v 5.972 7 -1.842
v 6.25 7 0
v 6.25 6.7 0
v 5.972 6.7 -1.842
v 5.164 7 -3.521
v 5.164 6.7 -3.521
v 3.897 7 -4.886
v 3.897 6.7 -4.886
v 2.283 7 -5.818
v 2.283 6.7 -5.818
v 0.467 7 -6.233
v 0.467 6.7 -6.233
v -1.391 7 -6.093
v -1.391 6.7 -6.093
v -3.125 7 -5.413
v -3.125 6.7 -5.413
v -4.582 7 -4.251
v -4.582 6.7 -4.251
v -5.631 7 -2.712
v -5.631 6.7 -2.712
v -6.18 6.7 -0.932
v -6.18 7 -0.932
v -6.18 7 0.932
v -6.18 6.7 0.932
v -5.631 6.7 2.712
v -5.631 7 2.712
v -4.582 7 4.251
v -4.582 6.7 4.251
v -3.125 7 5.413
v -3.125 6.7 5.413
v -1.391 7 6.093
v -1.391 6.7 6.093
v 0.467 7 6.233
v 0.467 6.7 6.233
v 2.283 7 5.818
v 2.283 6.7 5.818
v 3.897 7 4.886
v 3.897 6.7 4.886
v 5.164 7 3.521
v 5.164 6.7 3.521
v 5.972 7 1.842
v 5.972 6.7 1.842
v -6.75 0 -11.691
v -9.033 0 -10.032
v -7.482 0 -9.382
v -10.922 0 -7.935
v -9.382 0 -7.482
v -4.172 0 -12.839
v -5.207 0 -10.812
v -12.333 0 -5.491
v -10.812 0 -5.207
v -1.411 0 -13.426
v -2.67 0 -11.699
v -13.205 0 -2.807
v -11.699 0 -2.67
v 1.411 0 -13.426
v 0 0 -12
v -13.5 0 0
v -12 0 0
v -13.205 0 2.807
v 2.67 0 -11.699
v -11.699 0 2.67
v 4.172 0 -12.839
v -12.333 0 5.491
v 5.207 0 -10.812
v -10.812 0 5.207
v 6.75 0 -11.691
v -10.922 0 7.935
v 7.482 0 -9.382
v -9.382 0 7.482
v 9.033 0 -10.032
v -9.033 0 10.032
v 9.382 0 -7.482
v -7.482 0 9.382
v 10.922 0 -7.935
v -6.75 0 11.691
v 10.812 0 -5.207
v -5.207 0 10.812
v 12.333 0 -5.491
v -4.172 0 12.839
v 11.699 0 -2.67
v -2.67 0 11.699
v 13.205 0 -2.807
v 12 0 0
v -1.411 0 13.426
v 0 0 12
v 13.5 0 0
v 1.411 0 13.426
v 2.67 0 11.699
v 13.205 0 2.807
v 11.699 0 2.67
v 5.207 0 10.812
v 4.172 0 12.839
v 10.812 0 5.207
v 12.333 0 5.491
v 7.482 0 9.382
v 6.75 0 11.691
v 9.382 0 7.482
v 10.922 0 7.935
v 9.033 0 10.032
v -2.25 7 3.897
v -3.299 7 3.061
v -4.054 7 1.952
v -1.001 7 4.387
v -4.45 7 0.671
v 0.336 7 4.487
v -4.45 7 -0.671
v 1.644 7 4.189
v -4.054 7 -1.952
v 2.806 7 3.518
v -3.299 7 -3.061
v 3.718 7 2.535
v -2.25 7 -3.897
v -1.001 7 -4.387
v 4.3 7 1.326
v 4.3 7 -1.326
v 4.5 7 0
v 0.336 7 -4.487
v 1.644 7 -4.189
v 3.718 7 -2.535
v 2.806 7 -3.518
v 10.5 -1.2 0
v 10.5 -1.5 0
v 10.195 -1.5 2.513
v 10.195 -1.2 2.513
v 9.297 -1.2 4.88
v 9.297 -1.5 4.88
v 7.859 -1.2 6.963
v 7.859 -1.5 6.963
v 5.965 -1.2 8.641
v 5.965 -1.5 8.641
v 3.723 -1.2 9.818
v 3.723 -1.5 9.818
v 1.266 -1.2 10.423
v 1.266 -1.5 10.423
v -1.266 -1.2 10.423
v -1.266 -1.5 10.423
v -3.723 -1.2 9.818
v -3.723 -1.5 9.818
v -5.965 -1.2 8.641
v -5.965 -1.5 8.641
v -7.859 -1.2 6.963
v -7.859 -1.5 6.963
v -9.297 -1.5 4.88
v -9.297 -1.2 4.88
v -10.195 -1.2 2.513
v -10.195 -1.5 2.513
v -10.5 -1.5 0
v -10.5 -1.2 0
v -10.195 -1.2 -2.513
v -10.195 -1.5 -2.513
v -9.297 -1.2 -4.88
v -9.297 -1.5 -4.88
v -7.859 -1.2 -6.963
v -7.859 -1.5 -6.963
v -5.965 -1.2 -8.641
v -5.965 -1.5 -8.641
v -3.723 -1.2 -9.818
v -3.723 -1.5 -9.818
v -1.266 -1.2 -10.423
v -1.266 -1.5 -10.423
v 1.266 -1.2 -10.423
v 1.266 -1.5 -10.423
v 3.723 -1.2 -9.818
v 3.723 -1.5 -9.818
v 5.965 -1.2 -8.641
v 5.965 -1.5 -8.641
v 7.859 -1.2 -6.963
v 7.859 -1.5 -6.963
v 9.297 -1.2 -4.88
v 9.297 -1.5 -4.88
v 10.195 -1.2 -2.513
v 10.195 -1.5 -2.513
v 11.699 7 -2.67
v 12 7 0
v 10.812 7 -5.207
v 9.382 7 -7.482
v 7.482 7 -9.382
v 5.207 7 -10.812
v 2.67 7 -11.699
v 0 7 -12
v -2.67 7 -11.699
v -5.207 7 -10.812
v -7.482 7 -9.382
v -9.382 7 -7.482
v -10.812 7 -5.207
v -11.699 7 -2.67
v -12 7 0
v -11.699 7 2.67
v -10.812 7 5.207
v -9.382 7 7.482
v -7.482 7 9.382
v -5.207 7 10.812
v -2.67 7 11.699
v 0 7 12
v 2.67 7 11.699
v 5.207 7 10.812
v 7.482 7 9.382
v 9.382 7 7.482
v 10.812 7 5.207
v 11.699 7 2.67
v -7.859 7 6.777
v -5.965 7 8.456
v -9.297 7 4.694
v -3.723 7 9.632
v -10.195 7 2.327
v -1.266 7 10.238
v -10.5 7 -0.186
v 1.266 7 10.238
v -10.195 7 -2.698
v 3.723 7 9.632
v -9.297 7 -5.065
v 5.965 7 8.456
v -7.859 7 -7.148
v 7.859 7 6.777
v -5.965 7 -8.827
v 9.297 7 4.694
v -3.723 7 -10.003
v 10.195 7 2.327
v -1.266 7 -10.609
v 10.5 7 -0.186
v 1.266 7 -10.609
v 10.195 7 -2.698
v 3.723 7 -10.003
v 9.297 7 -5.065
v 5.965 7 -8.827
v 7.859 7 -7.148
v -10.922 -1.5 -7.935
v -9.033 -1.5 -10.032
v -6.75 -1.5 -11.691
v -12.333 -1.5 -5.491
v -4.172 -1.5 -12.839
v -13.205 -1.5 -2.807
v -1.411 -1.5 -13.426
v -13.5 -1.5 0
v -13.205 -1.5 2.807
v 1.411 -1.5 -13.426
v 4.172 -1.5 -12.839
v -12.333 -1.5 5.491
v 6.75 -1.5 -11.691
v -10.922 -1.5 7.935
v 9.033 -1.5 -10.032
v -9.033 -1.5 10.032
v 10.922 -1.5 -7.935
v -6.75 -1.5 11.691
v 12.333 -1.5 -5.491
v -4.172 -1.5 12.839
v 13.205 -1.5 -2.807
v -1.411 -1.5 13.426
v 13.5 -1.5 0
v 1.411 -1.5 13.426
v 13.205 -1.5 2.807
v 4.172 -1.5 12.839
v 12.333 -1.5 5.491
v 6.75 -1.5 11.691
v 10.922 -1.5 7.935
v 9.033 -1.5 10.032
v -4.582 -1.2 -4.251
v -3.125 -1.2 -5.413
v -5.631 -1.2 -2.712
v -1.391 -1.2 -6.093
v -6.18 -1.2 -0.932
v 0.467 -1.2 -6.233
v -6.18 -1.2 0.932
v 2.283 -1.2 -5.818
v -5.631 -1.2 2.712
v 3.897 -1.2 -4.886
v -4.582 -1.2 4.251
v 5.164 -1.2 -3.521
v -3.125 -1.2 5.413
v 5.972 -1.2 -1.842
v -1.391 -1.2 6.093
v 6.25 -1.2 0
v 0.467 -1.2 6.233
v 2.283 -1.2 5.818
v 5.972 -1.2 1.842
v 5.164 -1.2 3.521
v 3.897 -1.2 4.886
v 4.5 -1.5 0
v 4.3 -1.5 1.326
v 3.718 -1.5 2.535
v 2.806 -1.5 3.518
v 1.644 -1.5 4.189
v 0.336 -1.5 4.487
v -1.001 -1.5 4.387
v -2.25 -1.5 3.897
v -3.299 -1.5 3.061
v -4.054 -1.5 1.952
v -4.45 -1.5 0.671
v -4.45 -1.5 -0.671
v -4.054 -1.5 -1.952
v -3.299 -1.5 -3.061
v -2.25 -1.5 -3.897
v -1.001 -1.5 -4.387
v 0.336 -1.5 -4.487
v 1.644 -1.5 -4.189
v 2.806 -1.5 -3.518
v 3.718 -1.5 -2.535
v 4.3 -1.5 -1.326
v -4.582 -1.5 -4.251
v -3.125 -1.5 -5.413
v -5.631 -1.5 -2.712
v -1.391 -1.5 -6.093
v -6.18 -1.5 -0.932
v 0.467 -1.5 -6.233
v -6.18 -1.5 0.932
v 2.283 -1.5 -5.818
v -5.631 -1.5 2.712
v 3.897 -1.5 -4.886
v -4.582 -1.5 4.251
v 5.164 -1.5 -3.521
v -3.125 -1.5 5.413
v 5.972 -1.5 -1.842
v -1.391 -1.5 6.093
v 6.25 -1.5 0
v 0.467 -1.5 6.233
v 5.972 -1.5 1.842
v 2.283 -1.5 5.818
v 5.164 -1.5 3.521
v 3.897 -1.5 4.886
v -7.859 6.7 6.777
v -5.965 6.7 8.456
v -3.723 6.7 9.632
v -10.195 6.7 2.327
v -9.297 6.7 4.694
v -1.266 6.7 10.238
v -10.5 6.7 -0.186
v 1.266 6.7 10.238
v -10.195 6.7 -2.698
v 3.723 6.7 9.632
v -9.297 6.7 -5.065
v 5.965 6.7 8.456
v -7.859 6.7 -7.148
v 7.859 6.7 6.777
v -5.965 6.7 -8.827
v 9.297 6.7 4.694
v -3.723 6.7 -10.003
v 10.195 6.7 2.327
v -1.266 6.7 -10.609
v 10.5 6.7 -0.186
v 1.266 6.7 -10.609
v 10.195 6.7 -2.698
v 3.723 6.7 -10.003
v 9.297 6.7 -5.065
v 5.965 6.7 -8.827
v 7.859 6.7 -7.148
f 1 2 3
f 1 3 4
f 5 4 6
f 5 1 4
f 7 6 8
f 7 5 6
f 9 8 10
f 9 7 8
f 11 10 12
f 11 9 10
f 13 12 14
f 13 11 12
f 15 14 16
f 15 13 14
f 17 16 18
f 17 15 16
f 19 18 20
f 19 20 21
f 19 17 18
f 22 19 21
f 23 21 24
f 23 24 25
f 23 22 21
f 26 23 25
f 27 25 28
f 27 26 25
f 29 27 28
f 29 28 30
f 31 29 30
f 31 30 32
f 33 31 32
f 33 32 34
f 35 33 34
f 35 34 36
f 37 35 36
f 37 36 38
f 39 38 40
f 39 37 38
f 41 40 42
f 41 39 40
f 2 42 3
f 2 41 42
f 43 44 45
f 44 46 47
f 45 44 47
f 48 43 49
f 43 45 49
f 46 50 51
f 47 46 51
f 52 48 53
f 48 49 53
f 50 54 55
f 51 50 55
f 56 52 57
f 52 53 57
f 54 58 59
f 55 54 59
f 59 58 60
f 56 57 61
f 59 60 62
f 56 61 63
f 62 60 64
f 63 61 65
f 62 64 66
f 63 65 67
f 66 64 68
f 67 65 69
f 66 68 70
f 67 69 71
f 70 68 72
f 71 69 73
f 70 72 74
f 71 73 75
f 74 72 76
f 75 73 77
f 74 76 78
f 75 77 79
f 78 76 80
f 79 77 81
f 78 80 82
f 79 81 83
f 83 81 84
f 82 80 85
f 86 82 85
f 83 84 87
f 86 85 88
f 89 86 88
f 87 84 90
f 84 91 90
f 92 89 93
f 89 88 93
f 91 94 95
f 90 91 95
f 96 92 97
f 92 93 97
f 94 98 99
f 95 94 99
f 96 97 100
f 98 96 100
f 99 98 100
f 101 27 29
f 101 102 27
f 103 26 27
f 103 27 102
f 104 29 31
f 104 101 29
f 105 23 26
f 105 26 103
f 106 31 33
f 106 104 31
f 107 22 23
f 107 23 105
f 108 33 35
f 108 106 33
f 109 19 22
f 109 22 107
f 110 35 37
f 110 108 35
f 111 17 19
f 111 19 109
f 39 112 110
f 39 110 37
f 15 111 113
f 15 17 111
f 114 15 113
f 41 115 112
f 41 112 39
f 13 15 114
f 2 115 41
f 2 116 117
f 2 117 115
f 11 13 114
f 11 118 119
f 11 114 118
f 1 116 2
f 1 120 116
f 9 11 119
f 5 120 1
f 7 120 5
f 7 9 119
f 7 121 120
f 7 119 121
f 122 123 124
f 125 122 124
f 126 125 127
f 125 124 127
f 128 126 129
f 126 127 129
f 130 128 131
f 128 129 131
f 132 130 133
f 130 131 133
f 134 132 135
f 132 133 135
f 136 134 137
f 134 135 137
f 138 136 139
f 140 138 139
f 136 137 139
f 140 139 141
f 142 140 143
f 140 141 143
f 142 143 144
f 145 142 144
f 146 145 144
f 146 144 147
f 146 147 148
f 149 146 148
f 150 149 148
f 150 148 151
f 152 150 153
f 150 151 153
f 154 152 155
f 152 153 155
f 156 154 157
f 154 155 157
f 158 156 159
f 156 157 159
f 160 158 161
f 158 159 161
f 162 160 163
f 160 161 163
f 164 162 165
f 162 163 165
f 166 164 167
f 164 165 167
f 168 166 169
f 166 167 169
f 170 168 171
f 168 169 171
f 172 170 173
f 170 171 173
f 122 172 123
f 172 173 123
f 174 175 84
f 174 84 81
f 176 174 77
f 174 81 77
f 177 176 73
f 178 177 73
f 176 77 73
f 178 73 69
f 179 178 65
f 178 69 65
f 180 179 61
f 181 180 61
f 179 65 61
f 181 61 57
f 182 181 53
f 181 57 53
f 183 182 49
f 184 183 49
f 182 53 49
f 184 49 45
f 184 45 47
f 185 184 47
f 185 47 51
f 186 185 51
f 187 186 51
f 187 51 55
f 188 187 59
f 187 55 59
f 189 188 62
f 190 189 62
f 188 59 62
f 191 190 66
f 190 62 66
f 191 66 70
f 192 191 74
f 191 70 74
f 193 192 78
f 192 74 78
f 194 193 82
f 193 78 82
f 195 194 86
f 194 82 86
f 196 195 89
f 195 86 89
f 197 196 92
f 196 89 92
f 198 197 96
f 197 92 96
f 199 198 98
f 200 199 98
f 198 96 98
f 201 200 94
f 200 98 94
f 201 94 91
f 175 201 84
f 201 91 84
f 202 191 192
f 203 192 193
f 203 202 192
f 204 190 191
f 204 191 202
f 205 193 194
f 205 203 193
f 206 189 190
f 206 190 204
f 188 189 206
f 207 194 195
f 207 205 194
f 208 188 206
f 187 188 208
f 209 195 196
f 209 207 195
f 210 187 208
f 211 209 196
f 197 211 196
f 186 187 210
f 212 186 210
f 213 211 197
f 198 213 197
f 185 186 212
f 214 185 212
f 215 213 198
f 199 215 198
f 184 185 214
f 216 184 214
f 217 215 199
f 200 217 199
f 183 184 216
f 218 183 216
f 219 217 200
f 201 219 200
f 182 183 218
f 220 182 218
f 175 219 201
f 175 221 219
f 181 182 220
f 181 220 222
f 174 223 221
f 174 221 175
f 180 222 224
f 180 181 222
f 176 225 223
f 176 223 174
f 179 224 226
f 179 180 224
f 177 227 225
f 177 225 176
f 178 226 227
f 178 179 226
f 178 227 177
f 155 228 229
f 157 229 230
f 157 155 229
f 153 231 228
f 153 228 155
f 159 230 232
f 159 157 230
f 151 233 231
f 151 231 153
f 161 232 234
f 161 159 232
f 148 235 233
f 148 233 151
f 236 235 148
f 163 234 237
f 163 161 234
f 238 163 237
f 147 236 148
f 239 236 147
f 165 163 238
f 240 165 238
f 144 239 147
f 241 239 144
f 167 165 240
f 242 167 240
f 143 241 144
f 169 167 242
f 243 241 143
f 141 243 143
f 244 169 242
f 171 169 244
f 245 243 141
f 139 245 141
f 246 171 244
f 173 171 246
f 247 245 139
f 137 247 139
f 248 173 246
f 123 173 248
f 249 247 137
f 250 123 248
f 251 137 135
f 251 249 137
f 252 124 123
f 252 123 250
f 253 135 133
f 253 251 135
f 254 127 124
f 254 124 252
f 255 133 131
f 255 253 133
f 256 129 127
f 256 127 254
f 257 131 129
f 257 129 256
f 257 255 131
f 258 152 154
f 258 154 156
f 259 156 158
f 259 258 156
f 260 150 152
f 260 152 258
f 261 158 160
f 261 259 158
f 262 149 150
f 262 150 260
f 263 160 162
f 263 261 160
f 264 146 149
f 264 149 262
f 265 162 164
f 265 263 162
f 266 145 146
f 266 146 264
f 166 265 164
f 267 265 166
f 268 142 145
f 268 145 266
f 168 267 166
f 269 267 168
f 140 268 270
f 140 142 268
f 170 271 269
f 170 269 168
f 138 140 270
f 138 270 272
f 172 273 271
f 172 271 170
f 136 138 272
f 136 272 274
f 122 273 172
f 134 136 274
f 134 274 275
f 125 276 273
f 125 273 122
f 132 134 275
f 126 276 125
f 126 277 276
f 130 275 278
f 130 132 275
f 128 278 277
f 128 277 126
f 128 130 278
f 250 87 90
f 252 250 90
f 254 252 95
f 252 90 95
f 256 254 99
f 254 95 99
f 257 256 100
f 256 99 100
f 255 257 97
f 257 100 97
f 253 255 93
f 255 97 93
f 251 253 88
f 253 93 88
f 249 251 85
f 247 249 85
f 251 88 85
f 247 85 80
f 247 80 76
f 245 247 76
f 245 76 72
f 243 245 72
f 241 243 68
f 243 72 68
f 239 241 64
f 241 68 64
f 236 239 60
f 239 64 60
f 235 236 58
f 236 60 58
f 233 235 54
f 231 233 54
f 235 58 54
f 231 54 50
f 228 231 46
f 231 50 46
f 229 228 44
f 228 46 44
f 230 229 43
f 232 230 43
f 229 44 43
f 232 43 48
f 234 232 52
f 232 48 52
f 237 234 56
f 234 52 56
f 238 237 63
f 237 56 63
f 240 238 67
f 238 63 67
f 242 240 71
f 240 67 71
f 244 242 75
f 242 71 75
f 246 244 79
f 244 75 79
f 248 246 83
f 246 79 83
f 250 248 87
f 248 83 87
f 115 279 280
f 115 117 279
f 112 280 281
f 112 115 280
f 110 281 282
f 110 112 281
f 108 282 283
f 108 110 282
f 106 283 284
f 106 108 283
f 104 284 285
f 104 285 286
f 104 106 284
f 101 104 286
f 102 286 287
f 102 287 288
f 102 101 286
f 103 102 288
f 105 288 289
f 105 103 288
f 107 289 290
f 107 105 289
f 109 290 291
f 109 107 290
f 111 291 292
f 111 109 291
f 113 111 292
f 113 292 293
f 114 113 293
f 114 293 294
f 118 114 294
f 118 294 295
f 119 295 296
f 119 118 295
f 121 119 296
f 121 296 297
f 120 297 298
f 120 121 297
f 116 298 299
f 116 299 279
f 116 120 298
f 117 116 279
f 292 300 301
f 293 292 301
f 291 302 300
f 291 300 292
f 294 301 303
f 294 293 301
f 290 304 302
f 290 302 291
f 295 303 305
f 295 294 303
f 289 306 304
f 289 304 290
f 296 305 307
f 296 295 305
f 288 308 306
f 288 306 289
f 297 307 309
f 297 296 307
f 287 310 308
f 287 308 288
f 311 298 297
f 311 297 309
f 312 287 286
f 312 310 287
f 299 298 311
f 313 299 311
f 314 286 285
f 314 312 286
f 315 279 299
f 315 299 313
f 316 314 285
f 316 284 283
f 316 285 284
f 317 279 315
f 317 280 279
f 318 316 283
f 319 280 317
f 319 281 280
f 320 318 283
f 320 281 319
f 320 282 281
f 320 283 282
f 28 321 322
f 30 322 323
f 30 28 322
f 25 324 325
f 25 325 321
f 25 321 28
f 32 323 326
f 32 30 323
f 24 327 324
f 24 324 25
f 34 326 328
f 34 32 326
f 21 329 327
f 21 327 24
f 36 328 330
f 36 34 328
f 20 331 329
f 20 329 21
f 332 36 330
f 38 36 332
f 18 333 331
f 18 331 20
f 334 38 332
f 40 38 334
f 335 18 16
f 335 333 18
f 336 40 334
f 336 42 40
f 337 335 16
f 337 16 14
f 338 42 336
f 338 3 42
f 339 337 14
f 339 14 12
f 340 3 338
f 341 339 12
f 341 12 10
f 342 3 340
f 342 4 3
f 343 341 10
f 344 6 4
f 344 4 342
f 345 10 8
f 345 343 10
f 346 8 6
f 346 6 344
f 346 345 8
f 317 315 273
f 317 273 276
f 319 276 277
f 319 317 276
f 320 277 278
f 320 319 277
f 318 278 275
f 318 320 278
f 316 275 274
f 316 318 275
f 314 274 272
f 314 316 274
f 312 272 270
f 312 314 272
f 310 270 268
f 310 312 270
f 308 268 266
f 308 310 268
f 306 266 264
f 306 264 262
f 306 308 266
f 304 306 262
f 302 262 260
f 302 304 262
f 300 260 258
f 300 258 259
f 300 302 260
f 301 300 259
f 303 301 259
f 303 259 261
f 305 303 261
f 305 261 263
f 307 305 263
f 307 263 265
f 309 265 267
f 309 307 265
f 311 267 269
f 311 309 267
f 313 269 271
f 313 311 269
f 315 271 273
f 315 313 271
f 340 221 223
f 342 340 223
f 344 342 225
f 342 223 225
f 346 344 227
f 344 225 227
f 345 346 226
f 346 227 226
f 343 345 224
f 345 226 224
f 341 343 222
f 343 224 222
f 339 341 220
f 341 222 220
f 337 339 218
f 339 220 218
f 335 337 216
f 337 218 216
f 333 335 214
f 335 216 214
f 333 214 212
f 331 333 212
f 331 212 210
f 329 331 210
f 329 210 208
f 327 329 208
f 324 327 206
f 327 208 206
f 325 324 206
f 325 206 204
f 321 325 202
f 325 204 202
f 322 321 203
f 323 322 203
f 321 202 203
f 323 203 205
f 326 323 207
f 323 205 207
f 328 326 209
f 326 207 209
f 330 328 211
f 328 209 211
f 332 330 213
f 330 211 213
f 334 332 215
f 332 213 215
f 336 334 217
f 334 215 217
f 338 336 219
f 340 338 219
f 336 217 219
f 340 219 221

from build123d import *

# Parameters (mm, degrees)
SKETCH_1_R          = 12
SKETCH_1_R_2        = 4.5
EXTRUDE_1_DEPTH     = 7
SKETCH_2_R          = 13.5
SKETCH_2_R_2        = 4.5
EXTRUDE_2_DEPTH     = 1.5
SKETCH_3_R          = 10.5
SKETCH_3_R_2        = 6.25
CUT_EXTRUDE_1_DEPTH = 0.3
SKETCH_4_R          = 10.5
SKETCH_4_R_2        = 6.25
CUT_EXTRUDE_2_DEPTH = 0.3


with BuildPart() as part:
    # 草图1 → 凸台-拉伸1 (new body)
    with BuildSketch(Plane(origin=(0, 0, 0), x_dir=(1, 0, 0), z_dir=(0, 1, 0))):
        Circle(SKETCH_1_R)
        Circle(SKETCH_1_R_2, mode=Mode.SUBTRACT)
    extrude(amount=EXTRUDE_1_DEPTH)

    # 草图2 → 凸台-拉伸2 (add)
    with BuildSketch(Plane.XZ):
        Circle(SKETCH_2_R)
        Circle(SKETCH_2_R_2, mode=Mode.SUBTRACT)
    extrude(amount=EXTRUDE_2_DEPTH)

    # 草图3 → 切除-拉伸1 (cut)
    with BuildSketch(Plane(origin=(0, 7, 0), x_dir=(1, 0, 0), z_dir=(0, 1, 0))):
        with Locations((0, 0.185580925)):
            Circle(SKETCH_3_R)
        Circle(SKETCH_3_R_2, mode=Mode.SUBTRACT)
    extrude(amount=-CUT_EXTRUDE_1_DEPTH, mode=Mode.SUBTRACT)

    # 草图4 → 切除-拉伸2 (cut)
    with BuildSketch(Plane.XZ.offset(1.5)):
        Circle(SKETCH_4_R)
        Circle(SKETCH_4_R_2, mode=Mode.SUBTRACT)
    extrude(amount=-CUT_EXTRUDE_2_DEPTH, mode=Mode.SUBTRACT)


solid = part.part
